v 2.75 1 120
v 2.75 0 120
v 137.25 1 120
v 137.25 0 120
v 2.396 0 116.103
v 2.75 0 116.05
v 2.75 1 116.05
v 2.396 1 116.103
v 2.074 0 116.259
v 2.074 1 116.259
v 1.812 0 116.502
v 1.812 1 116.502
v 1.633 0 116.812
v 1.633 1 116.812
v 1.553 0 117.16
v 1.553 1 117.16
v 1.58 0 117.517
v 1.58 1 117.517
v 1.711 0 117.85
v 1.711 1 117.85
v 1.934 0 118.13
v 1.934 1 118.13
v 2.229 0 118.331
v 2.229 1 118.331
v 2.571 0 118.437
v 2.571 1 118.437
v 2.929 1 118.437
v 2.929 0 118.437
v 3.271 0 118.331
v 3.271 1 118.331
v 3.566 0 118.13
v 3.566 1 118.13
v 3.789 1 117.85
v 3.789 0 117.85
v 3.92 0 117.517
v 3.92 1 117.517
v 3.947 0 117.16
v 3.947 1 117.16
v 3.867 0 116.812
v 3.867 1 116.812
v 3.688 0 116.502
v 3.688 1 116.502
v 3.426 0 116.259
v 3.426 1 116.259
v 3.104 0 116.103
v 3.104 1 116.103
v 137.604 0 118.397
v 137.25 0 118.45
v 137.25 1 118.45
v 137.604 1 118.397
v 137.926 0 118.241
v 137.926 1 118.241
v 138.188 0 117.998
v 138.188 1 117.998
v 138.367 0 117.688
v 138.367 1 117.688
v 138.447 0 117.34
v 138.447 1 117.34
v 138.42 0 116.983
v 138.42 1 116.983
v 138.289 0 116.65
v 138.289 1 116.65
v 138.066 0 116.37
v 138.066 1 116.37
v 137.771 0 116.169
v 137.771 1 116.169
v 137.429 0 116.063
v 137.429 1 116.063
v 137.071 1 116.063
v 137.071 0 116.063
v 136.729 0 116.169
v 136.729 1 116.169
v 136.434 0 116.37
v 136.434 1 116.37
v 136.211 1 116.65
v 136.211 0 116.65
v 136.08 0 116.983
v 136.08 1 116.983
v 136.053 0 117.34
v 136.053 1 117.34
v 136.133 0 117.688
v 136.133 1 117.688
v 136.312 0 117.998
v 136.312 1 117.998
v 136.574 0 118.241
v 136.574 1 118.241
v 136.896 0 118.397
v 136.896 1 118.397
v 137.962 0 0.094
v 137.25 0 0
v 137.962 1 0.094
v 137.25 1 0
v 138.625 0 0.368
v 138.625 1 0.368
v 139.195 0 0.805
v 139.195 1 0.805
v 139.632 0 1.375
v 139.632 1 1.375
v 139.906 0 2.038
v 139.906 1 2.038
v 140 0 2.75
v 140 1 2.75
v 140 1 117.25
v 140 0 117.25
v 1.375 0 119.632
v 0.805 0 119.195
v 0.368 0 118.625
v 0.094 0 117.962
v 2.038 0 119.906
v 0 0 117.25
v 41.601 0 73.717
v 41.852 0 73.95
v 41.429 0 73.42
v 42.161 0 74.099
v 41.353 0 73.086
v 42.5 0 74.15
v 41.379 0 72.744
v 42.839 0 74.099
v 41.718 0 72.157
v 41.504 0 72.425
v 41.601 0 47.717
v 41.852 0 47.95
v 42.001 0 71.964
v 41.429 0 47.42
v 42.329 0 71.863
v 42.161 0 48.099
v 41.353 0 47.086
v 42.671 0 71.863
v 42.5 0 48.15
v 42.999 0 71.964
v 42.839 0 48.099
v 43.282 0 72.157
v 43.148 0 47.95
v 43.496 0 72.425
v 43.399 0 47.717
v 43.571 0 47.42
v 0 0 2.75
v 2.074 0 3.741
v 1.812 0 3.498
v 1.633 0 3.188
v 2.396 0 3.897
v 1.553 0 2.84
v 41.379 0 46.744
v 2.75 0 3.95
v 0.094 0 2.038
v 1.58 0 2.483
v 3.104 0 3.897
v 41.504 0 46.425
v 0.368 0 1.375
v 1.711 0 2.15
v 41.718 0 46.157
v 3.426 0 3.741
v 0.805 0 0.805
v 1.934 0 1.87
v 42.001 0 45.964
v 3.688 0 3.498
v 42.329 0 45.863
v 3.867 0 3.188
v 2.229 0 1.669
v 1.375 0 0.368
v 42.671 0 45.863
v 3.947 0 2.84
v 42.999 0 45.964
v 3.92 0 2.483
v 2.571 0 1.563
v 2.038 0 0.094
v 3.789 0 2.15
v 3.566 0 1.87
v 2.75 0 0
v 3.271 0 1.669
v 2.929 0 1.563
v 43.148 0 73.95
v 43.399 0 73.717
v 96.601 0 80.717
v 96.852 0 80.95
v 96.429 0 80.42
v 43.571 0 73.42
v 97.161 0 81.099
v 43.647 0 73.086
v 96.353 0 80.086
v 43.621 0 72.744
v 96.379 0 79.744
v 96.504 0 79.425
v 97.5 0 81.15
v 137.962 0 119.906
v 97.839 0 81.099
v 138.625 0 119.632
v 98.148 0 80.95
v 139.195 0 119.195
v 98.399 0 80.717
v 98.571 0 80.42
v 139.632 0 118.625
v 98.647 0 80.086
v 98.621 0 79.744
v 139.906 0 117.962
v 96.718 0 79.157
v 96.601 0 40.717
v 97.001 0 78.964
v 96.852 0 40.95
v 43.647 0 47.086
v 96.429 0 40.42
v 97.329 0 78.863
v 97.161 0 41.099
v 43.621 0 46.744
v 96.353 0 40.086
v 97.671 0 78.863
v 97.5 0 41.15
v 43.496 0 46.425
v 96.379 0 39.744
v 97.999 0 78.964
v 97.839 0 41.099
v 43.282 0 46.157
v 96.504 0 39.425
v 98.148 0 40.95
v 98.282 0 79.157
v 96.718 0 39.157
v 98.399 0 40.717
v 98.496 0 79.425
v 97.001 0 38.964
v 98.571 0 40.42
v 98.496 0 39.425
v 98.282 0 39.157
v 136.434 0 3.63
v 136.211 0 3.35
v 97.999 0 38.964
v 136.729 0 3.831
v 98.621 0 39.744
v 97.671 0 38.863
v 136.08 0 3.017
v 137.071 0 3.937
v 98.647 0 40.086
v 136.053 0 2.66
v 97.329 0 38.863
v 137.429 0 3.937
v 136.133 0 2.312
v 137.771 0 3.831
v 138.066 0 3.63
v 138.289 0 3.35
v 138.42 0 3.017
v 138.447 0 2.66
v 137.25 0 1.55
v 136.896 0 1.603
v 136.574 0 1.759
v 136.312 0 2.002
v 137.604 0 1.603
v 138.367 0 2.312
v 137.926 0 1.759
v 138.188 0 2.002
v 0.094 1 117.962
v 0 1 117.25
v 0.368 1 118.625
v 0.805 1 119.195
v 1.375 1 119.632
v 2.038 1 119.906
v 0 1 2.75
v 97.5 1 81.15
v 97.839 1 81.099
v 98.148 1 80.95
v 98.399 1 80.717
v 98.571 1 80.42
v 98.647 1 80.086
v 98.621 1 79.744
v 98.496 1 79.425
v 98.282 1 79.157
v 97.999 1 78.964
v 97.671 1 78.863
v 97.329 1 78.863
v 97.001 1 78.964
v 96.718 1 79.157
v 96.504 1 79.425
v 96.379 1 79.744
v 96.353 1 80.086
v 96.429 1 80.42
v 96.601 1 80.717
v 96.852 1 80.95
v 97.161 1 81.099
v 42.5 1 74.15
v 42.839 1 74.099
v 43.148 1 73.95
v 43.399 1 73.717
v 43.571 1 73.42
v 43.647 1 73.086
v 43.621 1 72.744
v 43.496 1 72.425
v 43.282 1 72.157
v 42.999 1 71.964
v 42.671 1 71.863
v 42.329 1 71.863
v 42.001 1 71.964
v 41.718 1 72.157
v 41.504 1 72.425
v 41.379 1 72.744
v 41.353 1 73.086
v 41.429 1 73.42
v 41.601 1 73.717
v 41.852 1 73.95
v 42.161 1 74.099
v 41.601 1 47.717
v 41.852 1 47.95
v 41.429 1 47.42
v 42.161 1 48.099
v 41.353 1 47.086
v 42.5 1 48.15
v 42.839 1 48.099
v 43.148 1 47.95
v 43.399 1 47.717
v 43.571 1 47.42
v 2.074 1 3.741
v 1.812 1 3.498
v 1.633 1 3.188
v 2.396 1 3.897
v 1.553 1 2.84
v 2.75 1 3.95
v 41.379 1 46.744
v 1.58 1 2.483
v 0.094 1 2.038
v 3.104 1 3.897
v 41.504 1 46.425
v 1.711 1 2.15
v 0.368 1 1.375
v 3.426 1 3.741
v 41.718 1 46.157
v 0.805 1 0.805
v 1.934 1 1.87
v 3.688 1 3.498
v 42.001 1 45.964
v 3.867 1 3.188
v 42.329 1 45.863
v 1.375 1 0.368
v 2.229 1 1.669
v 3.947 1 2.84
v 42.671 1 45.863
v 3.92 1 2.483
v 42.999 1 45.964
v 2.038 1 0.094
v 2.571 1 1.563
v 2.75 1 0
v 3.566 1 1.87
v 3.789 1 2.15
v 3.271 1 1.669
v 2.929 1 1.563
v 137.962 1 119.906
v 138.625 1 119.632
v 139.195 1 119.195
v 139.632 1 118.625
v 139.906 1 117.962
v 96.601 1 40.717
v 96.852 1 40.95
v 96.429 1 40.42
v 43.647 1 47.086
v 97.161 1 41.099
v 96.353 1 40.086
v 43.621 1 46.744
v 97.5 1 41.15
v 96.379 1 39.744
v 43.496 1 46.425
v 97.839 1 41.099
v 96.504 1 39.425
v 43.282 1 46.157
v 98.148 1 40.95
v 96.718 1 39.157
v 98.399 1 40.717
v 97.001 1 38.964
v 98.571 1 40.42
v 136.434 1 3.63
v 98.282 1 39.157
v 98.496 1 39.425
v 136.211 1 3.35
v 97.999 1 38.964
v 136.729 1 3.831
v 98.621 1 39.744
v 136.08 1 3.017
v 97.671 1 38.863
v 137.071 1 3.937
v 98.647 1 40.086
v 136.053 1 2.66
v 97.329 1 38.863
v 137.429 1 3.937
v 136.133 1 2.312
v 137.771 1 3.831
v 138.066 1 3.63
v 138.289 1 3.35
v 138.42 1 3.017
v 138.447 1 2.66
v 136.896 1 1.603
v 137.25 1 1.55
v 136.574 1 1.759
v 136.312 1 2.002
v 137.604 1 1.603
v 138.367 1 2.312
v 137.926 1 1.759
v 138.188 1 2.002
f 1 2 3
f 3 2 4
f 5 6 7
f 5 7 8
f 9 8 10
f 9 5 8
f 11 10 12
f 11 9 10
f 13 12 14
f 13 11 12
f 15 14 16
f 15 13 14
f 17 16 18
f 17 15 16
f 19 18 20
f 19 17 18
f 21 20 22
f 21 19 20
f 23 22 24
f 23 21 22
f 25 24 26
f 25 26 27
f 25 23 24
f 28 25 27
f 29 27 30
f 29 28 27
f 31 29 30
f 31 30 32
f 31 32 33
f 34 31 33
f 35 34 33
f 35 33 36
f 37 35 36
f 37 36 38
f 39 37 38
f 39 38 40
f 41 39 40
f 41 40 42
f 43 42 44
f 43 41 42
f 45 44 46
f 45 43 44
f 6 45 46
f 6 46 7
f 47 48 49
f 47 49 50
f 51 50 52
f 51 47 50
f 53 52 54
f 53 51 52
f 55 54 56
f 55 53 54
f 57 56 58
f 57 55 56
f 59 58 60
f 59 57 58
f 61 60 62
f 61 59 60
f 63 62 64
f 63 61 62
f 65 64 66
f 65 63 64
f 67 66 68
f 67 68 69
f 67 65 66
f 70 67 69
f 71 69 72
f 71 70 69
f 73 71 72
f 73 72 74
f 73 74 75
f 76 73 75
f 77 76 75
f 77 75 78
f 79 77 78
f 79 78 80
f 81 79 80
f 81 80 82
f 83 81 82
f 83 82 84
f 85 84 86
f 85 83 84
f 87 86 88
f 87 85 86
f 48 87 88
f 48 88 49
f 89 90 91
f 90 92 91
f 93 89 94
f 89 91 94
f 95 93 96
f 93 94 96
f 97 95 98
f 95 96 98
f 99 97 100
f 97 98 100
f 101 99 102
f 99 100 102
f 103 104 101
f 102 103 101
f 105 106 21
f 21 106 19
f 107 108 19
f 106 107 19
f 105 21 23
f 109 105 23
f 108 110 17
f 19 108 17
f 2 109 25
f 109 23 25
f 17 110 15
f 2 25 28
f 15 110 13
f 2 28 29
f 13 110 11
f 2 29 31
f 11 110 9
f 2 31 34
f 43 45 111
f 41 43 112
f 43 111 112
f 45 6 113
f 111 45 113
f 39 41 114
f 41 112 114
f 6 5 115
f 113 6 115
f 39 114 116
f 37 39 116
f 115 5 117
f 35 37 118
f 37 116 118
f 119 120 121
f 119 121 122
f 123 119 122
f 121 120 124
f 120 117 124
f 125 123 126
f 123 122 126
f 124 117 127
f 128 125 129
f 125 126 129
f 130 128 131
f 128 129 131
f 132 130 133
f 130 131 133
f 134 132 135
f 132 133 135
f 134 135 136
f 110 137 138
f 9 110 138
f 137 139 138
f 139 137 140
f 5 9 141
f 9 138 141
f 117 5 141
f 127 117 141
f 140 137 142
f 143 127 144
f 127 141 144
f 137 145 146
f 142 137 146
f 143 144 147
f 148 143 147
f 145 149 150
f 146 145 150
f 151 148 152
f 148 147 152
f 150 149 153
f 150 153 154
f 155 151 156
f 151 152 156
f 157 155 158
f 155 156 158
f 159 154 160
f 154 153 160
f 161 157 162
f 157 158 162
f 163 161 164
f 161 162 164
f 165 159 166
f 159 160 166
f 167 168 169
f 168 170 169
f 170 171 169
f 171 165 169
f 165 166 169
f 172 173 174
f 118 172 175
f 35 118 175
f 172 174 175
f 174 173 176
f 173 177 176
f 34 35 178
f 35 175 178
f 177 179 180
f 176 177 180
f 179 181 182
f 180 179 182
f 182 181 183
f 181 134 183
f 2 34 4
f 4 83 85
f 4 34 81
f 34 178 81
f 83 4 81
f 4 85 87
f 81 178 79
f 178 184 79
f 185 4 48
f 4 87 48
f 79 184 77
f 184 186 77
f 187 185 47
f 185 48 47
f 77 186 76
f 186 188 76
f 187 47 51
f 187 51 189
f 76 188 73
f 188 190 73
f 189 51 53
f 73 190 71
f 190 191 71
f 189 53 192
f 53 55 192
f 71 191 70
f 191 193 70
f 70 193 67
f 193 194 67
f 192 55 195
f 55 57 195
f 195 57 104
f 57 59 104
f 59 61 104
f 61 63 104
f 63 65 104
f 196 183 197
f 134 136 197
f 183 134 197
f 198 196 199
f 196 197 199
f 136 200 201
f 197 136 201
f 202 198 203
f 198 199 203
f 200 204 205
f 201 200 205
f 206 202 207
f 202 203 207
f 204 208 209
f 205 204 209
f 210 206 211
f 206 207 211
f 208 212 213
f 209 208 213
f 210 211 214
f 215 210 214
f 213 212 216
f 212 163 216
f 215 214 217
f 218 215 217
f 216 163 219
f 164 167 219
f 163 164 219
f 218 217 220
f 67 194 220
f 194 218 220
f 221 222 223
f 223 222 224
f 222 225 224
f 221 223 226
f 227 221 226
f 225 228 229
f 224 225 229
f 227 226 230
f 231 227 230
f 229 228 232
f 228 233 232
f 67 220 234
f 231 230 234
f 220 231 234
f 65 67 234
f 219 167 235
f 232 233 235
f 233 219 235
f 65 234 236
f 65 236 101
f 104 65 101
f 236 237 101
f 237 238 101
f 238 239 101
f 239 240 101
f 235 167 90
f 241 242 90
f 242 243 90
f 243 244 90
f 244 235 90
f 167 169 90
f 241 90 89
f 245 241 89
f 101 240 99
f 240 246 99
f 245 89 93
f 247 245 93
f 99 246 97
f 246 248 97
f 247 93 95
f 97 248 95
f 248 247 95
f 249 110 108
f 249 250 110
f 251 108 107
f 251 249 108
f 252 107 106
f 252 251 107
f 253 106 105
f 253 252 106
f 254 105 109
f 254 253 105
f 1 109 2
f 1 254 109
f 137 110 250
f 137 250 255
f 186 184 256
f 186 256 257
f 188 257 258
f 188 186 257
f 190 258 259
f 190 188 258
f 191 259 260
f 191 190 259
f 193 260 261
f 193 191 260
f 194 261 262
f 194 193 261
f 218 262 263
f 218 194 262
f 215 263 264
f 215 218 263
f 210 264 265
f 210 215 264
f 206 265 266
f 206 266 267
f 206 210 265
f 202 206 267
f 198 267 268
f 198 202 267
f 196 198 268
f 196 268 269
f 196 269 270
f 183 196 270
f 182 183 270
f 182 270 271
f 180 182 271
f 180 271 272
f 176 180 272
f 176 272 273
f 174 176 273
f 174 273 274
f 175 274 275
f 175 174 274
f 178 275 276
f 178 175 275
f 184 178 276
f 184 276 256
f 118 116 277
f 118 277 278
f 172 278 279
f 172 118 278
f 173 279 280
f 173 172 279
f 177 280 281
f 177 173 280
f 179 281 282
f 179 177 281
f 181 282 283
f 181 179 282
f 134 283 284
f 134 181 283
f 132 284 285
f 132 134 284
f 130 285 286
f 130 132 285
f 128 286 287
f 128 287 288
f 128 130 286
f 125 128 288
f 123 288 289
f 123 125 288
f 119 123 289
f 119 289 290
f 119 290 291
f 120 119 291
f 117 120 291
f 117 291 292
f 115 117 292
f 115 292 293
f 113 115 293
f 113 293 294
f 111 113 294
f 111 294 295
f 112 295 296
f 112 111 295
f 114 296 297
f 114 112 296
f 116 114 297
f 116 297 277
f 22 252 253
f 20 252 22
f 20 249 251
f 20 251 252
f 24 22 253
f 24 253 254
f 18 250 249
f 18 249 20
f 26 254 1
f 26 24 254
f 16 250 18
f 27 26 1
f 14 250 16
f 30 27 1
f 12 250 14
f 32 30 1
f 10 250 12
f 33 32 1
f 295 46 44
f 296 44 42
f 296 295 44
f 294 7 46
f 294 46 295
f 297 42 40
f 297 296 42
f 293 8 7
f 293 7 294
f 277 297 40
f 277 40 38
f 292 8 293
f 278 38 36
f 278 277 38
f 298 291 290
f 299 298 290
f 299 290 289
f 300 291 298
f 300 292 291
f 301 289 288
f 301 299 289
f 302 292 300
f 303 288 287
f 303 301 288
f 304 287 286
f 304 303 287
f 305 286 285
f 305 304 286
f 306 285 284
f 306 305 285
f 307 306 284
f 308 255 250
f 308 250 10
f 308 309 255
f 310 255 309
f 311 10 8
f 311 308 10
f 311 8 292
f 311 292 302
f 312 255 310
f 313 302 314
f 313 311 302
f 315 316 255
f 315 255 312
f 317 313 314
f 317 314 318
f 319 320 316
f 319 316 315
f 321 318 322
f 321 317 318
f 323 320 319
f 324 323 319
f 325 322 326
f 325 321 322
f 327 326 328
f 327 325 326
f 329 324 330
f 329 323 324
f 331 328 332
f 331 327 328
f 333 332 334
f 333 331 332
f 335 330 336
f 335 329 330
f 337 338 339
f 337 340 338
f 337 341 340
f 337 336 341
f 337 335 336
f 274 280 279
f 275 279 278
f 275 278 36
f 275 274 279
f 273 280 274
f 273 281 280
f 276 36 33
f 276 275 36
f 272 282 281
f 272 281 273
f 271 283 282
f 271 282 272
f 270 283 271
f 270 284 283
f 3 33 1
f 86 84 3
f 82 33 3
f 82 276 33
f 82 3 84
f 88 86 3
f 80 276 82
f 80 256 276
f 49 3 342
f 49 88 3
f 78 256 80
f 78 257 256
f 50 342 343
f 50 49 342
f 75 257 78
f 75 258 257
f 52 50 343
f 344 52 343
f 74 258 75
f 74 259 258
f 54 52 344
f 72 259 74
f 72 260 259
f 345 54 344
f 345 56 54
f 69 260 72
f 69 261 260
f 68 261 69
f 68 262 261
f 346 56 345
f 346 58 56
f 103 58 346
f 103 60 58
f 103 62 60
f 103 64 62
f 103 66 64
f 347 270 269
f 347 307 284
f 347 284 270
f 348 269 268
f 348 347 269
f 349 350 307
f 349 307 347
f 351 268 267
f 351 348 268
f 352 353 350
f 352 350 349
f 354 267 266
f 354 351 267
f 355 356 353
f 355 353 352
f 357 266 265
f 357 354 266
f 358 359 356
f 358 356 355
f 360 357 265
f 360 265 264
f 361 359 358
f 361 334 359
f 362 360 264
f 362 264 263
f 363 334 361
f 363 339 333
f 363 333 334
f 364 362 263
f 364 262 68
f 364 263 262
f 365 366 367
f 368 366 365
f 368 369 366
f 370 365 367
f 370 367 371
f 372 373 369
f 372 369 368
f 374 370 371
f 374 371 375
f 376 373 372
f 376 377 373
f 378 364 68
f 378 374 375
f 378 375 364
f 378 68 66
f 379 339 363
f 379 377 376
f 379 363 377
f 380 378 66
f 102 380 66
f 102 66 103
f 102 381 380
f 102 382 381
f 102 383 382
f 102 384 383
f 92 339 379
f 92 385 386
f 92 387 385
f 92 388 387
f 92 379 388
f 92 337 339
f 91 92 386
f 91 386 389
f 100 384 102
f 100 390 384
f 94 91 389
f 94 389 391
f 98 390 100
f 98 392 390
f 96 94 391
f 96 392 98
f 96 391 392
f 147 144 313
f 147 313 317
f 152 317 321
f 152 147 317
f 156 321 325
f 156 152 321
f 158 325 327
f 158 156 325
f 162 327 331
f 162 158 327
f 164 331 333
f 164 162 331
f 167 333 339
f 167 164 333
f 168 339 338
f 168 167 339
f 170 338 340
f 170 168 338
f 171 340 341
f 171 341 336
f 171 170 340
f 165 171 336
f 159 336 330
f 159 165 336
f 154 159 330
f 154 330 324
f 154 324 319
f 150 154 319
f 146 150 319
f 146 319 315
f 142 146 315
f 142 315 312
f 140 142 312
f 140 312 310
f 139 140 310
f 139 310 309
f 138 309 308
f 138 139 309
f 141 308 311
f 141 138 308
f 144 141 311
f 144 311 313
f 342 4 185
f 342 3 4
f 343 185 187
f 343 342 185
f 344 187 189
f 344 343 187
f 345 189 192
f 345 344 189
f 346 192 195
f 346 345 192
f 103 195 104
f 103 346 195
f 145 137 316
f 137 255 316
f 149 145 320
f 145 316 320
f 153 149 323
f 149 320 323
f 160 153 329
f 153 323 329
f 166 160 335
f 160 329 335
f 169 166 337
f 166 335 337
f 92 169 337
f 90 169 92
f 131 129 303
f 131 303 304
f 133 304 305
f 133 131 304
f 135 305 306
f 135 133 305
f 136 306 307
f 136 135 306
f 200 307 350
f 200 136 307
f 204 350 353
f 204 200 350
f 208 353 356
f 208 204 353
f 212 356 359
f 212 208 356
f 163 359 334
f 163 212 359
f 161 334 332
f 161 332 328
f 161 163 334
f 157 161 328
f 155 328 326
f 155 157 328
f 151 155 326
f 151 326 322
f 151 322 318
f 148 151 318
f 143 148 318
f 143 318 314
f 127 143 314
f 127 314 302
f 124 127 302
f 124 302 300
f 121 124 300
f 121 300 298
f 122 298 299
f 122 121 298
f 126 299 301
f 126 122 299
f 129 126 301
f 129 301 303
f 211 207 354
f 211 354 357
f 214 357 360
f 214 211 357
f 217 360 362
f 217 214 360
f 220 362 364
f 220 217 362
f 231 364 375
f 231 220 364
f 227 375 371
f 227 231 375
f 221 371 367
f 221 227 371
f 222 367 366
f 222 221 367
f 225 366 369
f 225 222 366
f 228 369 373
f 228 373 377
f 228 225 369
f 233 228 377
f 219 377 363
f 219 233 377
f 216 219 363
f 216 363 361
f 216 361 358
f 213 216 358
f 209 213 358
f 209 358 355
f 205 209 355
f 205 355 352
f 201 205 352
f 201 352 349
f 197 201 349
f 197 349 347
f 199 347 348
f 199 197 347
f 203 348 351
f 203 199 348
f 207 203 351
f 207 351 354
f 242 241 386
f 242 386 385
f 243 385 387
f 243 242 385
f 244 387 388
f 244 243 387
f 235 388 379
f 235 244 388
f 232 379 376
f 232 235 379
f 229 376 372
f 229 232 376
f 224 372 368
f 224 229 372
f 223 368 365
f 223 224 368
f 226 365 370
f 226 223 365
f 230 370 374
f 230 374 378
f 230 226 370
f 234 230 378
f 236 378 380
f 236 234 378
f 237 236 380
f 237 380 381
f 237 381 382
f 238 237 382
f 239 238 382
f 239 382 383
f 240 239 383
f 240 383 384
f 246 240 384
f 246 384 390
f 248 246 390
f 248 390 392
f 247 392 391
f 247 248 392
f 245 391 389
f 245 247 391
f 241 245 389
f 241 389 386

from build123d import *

# Parameters (mm, degrees)
SKETCH1_W           = 140
SKETCH1_H           = 120
SKETCH1_R           = 1.2
SKETCH1_R_2         = 1.15
BOSS_EXTRUDE1_DEPTH = 1
FILLET1_R           = 2.75


with BuildPart() as part:
    # Sketch1 → Boss-Extrude1 (new body)
    with BuildSketch(Plane(origin=(0, 0, 0), x_dir=(1, 0, 0), z_dir=(0, 1, 0))):
        with Locations((70, -60)):
            Rectangle(SKETCH1_W, SKETCH1_H)
        with Locations(Location((2.75, -2.75, 0), (0, 0, 270))):
            Circle(SKETCH1_R, mode=Mode.SUBTRACT)
        with Locations(Location((137.25, -2.75, 0), (0, 0, 90))):
            Circle(SKETCH1_R, mode=Mode.SUBTRACT)
        with Locations(Location((137.25, -117.25, 0), (0, 0, 270))):
            Circle(SKETCH1_R, mode=Mode.SUBTRACT)
        with Locations(Location((2.75, -117.25, 0), (0, 0, 90))):
            Circle(SKETCH1_R, mode=Mode.SUBTRACT)
        with Locations(Location((42.5, -47, 0), (0, 0, 270))):
            Circle(SKETCH1_R_2, mode=Mode.SUBTRACT)
        with Locations(Location((97.5, -40, 0), (0, 0, 270))):
            Circle(SKETCH1_R_2, mode=Mode.SUBTRACT)
        with Locations(Location((42.5, -73, 0), (0, 0, 270))):
            Circle(SKETCH1_R_2, mode=Mode.SUBTRACT)
        with Locations(Location((97.5, -80, 0), (0, 0, 270))):
            Circle(SKETCH1_R_2, mode=Mode.SUBTRACT)
    extrude(amount=BOSS_EXTRUDE1_DEPTH)

    # Fillet1
    fillet1_edges = [part.edges().sort_by_distance(p)[0] for p in [
        (0, 0.5, 0),
        (140, 0.5, 0),
        (140, 0.5, 120),
        (0, 0.5, 120),
    ]]
    fillet(fillet1_edges, radius=FILLET1_R)


solid = part.part
